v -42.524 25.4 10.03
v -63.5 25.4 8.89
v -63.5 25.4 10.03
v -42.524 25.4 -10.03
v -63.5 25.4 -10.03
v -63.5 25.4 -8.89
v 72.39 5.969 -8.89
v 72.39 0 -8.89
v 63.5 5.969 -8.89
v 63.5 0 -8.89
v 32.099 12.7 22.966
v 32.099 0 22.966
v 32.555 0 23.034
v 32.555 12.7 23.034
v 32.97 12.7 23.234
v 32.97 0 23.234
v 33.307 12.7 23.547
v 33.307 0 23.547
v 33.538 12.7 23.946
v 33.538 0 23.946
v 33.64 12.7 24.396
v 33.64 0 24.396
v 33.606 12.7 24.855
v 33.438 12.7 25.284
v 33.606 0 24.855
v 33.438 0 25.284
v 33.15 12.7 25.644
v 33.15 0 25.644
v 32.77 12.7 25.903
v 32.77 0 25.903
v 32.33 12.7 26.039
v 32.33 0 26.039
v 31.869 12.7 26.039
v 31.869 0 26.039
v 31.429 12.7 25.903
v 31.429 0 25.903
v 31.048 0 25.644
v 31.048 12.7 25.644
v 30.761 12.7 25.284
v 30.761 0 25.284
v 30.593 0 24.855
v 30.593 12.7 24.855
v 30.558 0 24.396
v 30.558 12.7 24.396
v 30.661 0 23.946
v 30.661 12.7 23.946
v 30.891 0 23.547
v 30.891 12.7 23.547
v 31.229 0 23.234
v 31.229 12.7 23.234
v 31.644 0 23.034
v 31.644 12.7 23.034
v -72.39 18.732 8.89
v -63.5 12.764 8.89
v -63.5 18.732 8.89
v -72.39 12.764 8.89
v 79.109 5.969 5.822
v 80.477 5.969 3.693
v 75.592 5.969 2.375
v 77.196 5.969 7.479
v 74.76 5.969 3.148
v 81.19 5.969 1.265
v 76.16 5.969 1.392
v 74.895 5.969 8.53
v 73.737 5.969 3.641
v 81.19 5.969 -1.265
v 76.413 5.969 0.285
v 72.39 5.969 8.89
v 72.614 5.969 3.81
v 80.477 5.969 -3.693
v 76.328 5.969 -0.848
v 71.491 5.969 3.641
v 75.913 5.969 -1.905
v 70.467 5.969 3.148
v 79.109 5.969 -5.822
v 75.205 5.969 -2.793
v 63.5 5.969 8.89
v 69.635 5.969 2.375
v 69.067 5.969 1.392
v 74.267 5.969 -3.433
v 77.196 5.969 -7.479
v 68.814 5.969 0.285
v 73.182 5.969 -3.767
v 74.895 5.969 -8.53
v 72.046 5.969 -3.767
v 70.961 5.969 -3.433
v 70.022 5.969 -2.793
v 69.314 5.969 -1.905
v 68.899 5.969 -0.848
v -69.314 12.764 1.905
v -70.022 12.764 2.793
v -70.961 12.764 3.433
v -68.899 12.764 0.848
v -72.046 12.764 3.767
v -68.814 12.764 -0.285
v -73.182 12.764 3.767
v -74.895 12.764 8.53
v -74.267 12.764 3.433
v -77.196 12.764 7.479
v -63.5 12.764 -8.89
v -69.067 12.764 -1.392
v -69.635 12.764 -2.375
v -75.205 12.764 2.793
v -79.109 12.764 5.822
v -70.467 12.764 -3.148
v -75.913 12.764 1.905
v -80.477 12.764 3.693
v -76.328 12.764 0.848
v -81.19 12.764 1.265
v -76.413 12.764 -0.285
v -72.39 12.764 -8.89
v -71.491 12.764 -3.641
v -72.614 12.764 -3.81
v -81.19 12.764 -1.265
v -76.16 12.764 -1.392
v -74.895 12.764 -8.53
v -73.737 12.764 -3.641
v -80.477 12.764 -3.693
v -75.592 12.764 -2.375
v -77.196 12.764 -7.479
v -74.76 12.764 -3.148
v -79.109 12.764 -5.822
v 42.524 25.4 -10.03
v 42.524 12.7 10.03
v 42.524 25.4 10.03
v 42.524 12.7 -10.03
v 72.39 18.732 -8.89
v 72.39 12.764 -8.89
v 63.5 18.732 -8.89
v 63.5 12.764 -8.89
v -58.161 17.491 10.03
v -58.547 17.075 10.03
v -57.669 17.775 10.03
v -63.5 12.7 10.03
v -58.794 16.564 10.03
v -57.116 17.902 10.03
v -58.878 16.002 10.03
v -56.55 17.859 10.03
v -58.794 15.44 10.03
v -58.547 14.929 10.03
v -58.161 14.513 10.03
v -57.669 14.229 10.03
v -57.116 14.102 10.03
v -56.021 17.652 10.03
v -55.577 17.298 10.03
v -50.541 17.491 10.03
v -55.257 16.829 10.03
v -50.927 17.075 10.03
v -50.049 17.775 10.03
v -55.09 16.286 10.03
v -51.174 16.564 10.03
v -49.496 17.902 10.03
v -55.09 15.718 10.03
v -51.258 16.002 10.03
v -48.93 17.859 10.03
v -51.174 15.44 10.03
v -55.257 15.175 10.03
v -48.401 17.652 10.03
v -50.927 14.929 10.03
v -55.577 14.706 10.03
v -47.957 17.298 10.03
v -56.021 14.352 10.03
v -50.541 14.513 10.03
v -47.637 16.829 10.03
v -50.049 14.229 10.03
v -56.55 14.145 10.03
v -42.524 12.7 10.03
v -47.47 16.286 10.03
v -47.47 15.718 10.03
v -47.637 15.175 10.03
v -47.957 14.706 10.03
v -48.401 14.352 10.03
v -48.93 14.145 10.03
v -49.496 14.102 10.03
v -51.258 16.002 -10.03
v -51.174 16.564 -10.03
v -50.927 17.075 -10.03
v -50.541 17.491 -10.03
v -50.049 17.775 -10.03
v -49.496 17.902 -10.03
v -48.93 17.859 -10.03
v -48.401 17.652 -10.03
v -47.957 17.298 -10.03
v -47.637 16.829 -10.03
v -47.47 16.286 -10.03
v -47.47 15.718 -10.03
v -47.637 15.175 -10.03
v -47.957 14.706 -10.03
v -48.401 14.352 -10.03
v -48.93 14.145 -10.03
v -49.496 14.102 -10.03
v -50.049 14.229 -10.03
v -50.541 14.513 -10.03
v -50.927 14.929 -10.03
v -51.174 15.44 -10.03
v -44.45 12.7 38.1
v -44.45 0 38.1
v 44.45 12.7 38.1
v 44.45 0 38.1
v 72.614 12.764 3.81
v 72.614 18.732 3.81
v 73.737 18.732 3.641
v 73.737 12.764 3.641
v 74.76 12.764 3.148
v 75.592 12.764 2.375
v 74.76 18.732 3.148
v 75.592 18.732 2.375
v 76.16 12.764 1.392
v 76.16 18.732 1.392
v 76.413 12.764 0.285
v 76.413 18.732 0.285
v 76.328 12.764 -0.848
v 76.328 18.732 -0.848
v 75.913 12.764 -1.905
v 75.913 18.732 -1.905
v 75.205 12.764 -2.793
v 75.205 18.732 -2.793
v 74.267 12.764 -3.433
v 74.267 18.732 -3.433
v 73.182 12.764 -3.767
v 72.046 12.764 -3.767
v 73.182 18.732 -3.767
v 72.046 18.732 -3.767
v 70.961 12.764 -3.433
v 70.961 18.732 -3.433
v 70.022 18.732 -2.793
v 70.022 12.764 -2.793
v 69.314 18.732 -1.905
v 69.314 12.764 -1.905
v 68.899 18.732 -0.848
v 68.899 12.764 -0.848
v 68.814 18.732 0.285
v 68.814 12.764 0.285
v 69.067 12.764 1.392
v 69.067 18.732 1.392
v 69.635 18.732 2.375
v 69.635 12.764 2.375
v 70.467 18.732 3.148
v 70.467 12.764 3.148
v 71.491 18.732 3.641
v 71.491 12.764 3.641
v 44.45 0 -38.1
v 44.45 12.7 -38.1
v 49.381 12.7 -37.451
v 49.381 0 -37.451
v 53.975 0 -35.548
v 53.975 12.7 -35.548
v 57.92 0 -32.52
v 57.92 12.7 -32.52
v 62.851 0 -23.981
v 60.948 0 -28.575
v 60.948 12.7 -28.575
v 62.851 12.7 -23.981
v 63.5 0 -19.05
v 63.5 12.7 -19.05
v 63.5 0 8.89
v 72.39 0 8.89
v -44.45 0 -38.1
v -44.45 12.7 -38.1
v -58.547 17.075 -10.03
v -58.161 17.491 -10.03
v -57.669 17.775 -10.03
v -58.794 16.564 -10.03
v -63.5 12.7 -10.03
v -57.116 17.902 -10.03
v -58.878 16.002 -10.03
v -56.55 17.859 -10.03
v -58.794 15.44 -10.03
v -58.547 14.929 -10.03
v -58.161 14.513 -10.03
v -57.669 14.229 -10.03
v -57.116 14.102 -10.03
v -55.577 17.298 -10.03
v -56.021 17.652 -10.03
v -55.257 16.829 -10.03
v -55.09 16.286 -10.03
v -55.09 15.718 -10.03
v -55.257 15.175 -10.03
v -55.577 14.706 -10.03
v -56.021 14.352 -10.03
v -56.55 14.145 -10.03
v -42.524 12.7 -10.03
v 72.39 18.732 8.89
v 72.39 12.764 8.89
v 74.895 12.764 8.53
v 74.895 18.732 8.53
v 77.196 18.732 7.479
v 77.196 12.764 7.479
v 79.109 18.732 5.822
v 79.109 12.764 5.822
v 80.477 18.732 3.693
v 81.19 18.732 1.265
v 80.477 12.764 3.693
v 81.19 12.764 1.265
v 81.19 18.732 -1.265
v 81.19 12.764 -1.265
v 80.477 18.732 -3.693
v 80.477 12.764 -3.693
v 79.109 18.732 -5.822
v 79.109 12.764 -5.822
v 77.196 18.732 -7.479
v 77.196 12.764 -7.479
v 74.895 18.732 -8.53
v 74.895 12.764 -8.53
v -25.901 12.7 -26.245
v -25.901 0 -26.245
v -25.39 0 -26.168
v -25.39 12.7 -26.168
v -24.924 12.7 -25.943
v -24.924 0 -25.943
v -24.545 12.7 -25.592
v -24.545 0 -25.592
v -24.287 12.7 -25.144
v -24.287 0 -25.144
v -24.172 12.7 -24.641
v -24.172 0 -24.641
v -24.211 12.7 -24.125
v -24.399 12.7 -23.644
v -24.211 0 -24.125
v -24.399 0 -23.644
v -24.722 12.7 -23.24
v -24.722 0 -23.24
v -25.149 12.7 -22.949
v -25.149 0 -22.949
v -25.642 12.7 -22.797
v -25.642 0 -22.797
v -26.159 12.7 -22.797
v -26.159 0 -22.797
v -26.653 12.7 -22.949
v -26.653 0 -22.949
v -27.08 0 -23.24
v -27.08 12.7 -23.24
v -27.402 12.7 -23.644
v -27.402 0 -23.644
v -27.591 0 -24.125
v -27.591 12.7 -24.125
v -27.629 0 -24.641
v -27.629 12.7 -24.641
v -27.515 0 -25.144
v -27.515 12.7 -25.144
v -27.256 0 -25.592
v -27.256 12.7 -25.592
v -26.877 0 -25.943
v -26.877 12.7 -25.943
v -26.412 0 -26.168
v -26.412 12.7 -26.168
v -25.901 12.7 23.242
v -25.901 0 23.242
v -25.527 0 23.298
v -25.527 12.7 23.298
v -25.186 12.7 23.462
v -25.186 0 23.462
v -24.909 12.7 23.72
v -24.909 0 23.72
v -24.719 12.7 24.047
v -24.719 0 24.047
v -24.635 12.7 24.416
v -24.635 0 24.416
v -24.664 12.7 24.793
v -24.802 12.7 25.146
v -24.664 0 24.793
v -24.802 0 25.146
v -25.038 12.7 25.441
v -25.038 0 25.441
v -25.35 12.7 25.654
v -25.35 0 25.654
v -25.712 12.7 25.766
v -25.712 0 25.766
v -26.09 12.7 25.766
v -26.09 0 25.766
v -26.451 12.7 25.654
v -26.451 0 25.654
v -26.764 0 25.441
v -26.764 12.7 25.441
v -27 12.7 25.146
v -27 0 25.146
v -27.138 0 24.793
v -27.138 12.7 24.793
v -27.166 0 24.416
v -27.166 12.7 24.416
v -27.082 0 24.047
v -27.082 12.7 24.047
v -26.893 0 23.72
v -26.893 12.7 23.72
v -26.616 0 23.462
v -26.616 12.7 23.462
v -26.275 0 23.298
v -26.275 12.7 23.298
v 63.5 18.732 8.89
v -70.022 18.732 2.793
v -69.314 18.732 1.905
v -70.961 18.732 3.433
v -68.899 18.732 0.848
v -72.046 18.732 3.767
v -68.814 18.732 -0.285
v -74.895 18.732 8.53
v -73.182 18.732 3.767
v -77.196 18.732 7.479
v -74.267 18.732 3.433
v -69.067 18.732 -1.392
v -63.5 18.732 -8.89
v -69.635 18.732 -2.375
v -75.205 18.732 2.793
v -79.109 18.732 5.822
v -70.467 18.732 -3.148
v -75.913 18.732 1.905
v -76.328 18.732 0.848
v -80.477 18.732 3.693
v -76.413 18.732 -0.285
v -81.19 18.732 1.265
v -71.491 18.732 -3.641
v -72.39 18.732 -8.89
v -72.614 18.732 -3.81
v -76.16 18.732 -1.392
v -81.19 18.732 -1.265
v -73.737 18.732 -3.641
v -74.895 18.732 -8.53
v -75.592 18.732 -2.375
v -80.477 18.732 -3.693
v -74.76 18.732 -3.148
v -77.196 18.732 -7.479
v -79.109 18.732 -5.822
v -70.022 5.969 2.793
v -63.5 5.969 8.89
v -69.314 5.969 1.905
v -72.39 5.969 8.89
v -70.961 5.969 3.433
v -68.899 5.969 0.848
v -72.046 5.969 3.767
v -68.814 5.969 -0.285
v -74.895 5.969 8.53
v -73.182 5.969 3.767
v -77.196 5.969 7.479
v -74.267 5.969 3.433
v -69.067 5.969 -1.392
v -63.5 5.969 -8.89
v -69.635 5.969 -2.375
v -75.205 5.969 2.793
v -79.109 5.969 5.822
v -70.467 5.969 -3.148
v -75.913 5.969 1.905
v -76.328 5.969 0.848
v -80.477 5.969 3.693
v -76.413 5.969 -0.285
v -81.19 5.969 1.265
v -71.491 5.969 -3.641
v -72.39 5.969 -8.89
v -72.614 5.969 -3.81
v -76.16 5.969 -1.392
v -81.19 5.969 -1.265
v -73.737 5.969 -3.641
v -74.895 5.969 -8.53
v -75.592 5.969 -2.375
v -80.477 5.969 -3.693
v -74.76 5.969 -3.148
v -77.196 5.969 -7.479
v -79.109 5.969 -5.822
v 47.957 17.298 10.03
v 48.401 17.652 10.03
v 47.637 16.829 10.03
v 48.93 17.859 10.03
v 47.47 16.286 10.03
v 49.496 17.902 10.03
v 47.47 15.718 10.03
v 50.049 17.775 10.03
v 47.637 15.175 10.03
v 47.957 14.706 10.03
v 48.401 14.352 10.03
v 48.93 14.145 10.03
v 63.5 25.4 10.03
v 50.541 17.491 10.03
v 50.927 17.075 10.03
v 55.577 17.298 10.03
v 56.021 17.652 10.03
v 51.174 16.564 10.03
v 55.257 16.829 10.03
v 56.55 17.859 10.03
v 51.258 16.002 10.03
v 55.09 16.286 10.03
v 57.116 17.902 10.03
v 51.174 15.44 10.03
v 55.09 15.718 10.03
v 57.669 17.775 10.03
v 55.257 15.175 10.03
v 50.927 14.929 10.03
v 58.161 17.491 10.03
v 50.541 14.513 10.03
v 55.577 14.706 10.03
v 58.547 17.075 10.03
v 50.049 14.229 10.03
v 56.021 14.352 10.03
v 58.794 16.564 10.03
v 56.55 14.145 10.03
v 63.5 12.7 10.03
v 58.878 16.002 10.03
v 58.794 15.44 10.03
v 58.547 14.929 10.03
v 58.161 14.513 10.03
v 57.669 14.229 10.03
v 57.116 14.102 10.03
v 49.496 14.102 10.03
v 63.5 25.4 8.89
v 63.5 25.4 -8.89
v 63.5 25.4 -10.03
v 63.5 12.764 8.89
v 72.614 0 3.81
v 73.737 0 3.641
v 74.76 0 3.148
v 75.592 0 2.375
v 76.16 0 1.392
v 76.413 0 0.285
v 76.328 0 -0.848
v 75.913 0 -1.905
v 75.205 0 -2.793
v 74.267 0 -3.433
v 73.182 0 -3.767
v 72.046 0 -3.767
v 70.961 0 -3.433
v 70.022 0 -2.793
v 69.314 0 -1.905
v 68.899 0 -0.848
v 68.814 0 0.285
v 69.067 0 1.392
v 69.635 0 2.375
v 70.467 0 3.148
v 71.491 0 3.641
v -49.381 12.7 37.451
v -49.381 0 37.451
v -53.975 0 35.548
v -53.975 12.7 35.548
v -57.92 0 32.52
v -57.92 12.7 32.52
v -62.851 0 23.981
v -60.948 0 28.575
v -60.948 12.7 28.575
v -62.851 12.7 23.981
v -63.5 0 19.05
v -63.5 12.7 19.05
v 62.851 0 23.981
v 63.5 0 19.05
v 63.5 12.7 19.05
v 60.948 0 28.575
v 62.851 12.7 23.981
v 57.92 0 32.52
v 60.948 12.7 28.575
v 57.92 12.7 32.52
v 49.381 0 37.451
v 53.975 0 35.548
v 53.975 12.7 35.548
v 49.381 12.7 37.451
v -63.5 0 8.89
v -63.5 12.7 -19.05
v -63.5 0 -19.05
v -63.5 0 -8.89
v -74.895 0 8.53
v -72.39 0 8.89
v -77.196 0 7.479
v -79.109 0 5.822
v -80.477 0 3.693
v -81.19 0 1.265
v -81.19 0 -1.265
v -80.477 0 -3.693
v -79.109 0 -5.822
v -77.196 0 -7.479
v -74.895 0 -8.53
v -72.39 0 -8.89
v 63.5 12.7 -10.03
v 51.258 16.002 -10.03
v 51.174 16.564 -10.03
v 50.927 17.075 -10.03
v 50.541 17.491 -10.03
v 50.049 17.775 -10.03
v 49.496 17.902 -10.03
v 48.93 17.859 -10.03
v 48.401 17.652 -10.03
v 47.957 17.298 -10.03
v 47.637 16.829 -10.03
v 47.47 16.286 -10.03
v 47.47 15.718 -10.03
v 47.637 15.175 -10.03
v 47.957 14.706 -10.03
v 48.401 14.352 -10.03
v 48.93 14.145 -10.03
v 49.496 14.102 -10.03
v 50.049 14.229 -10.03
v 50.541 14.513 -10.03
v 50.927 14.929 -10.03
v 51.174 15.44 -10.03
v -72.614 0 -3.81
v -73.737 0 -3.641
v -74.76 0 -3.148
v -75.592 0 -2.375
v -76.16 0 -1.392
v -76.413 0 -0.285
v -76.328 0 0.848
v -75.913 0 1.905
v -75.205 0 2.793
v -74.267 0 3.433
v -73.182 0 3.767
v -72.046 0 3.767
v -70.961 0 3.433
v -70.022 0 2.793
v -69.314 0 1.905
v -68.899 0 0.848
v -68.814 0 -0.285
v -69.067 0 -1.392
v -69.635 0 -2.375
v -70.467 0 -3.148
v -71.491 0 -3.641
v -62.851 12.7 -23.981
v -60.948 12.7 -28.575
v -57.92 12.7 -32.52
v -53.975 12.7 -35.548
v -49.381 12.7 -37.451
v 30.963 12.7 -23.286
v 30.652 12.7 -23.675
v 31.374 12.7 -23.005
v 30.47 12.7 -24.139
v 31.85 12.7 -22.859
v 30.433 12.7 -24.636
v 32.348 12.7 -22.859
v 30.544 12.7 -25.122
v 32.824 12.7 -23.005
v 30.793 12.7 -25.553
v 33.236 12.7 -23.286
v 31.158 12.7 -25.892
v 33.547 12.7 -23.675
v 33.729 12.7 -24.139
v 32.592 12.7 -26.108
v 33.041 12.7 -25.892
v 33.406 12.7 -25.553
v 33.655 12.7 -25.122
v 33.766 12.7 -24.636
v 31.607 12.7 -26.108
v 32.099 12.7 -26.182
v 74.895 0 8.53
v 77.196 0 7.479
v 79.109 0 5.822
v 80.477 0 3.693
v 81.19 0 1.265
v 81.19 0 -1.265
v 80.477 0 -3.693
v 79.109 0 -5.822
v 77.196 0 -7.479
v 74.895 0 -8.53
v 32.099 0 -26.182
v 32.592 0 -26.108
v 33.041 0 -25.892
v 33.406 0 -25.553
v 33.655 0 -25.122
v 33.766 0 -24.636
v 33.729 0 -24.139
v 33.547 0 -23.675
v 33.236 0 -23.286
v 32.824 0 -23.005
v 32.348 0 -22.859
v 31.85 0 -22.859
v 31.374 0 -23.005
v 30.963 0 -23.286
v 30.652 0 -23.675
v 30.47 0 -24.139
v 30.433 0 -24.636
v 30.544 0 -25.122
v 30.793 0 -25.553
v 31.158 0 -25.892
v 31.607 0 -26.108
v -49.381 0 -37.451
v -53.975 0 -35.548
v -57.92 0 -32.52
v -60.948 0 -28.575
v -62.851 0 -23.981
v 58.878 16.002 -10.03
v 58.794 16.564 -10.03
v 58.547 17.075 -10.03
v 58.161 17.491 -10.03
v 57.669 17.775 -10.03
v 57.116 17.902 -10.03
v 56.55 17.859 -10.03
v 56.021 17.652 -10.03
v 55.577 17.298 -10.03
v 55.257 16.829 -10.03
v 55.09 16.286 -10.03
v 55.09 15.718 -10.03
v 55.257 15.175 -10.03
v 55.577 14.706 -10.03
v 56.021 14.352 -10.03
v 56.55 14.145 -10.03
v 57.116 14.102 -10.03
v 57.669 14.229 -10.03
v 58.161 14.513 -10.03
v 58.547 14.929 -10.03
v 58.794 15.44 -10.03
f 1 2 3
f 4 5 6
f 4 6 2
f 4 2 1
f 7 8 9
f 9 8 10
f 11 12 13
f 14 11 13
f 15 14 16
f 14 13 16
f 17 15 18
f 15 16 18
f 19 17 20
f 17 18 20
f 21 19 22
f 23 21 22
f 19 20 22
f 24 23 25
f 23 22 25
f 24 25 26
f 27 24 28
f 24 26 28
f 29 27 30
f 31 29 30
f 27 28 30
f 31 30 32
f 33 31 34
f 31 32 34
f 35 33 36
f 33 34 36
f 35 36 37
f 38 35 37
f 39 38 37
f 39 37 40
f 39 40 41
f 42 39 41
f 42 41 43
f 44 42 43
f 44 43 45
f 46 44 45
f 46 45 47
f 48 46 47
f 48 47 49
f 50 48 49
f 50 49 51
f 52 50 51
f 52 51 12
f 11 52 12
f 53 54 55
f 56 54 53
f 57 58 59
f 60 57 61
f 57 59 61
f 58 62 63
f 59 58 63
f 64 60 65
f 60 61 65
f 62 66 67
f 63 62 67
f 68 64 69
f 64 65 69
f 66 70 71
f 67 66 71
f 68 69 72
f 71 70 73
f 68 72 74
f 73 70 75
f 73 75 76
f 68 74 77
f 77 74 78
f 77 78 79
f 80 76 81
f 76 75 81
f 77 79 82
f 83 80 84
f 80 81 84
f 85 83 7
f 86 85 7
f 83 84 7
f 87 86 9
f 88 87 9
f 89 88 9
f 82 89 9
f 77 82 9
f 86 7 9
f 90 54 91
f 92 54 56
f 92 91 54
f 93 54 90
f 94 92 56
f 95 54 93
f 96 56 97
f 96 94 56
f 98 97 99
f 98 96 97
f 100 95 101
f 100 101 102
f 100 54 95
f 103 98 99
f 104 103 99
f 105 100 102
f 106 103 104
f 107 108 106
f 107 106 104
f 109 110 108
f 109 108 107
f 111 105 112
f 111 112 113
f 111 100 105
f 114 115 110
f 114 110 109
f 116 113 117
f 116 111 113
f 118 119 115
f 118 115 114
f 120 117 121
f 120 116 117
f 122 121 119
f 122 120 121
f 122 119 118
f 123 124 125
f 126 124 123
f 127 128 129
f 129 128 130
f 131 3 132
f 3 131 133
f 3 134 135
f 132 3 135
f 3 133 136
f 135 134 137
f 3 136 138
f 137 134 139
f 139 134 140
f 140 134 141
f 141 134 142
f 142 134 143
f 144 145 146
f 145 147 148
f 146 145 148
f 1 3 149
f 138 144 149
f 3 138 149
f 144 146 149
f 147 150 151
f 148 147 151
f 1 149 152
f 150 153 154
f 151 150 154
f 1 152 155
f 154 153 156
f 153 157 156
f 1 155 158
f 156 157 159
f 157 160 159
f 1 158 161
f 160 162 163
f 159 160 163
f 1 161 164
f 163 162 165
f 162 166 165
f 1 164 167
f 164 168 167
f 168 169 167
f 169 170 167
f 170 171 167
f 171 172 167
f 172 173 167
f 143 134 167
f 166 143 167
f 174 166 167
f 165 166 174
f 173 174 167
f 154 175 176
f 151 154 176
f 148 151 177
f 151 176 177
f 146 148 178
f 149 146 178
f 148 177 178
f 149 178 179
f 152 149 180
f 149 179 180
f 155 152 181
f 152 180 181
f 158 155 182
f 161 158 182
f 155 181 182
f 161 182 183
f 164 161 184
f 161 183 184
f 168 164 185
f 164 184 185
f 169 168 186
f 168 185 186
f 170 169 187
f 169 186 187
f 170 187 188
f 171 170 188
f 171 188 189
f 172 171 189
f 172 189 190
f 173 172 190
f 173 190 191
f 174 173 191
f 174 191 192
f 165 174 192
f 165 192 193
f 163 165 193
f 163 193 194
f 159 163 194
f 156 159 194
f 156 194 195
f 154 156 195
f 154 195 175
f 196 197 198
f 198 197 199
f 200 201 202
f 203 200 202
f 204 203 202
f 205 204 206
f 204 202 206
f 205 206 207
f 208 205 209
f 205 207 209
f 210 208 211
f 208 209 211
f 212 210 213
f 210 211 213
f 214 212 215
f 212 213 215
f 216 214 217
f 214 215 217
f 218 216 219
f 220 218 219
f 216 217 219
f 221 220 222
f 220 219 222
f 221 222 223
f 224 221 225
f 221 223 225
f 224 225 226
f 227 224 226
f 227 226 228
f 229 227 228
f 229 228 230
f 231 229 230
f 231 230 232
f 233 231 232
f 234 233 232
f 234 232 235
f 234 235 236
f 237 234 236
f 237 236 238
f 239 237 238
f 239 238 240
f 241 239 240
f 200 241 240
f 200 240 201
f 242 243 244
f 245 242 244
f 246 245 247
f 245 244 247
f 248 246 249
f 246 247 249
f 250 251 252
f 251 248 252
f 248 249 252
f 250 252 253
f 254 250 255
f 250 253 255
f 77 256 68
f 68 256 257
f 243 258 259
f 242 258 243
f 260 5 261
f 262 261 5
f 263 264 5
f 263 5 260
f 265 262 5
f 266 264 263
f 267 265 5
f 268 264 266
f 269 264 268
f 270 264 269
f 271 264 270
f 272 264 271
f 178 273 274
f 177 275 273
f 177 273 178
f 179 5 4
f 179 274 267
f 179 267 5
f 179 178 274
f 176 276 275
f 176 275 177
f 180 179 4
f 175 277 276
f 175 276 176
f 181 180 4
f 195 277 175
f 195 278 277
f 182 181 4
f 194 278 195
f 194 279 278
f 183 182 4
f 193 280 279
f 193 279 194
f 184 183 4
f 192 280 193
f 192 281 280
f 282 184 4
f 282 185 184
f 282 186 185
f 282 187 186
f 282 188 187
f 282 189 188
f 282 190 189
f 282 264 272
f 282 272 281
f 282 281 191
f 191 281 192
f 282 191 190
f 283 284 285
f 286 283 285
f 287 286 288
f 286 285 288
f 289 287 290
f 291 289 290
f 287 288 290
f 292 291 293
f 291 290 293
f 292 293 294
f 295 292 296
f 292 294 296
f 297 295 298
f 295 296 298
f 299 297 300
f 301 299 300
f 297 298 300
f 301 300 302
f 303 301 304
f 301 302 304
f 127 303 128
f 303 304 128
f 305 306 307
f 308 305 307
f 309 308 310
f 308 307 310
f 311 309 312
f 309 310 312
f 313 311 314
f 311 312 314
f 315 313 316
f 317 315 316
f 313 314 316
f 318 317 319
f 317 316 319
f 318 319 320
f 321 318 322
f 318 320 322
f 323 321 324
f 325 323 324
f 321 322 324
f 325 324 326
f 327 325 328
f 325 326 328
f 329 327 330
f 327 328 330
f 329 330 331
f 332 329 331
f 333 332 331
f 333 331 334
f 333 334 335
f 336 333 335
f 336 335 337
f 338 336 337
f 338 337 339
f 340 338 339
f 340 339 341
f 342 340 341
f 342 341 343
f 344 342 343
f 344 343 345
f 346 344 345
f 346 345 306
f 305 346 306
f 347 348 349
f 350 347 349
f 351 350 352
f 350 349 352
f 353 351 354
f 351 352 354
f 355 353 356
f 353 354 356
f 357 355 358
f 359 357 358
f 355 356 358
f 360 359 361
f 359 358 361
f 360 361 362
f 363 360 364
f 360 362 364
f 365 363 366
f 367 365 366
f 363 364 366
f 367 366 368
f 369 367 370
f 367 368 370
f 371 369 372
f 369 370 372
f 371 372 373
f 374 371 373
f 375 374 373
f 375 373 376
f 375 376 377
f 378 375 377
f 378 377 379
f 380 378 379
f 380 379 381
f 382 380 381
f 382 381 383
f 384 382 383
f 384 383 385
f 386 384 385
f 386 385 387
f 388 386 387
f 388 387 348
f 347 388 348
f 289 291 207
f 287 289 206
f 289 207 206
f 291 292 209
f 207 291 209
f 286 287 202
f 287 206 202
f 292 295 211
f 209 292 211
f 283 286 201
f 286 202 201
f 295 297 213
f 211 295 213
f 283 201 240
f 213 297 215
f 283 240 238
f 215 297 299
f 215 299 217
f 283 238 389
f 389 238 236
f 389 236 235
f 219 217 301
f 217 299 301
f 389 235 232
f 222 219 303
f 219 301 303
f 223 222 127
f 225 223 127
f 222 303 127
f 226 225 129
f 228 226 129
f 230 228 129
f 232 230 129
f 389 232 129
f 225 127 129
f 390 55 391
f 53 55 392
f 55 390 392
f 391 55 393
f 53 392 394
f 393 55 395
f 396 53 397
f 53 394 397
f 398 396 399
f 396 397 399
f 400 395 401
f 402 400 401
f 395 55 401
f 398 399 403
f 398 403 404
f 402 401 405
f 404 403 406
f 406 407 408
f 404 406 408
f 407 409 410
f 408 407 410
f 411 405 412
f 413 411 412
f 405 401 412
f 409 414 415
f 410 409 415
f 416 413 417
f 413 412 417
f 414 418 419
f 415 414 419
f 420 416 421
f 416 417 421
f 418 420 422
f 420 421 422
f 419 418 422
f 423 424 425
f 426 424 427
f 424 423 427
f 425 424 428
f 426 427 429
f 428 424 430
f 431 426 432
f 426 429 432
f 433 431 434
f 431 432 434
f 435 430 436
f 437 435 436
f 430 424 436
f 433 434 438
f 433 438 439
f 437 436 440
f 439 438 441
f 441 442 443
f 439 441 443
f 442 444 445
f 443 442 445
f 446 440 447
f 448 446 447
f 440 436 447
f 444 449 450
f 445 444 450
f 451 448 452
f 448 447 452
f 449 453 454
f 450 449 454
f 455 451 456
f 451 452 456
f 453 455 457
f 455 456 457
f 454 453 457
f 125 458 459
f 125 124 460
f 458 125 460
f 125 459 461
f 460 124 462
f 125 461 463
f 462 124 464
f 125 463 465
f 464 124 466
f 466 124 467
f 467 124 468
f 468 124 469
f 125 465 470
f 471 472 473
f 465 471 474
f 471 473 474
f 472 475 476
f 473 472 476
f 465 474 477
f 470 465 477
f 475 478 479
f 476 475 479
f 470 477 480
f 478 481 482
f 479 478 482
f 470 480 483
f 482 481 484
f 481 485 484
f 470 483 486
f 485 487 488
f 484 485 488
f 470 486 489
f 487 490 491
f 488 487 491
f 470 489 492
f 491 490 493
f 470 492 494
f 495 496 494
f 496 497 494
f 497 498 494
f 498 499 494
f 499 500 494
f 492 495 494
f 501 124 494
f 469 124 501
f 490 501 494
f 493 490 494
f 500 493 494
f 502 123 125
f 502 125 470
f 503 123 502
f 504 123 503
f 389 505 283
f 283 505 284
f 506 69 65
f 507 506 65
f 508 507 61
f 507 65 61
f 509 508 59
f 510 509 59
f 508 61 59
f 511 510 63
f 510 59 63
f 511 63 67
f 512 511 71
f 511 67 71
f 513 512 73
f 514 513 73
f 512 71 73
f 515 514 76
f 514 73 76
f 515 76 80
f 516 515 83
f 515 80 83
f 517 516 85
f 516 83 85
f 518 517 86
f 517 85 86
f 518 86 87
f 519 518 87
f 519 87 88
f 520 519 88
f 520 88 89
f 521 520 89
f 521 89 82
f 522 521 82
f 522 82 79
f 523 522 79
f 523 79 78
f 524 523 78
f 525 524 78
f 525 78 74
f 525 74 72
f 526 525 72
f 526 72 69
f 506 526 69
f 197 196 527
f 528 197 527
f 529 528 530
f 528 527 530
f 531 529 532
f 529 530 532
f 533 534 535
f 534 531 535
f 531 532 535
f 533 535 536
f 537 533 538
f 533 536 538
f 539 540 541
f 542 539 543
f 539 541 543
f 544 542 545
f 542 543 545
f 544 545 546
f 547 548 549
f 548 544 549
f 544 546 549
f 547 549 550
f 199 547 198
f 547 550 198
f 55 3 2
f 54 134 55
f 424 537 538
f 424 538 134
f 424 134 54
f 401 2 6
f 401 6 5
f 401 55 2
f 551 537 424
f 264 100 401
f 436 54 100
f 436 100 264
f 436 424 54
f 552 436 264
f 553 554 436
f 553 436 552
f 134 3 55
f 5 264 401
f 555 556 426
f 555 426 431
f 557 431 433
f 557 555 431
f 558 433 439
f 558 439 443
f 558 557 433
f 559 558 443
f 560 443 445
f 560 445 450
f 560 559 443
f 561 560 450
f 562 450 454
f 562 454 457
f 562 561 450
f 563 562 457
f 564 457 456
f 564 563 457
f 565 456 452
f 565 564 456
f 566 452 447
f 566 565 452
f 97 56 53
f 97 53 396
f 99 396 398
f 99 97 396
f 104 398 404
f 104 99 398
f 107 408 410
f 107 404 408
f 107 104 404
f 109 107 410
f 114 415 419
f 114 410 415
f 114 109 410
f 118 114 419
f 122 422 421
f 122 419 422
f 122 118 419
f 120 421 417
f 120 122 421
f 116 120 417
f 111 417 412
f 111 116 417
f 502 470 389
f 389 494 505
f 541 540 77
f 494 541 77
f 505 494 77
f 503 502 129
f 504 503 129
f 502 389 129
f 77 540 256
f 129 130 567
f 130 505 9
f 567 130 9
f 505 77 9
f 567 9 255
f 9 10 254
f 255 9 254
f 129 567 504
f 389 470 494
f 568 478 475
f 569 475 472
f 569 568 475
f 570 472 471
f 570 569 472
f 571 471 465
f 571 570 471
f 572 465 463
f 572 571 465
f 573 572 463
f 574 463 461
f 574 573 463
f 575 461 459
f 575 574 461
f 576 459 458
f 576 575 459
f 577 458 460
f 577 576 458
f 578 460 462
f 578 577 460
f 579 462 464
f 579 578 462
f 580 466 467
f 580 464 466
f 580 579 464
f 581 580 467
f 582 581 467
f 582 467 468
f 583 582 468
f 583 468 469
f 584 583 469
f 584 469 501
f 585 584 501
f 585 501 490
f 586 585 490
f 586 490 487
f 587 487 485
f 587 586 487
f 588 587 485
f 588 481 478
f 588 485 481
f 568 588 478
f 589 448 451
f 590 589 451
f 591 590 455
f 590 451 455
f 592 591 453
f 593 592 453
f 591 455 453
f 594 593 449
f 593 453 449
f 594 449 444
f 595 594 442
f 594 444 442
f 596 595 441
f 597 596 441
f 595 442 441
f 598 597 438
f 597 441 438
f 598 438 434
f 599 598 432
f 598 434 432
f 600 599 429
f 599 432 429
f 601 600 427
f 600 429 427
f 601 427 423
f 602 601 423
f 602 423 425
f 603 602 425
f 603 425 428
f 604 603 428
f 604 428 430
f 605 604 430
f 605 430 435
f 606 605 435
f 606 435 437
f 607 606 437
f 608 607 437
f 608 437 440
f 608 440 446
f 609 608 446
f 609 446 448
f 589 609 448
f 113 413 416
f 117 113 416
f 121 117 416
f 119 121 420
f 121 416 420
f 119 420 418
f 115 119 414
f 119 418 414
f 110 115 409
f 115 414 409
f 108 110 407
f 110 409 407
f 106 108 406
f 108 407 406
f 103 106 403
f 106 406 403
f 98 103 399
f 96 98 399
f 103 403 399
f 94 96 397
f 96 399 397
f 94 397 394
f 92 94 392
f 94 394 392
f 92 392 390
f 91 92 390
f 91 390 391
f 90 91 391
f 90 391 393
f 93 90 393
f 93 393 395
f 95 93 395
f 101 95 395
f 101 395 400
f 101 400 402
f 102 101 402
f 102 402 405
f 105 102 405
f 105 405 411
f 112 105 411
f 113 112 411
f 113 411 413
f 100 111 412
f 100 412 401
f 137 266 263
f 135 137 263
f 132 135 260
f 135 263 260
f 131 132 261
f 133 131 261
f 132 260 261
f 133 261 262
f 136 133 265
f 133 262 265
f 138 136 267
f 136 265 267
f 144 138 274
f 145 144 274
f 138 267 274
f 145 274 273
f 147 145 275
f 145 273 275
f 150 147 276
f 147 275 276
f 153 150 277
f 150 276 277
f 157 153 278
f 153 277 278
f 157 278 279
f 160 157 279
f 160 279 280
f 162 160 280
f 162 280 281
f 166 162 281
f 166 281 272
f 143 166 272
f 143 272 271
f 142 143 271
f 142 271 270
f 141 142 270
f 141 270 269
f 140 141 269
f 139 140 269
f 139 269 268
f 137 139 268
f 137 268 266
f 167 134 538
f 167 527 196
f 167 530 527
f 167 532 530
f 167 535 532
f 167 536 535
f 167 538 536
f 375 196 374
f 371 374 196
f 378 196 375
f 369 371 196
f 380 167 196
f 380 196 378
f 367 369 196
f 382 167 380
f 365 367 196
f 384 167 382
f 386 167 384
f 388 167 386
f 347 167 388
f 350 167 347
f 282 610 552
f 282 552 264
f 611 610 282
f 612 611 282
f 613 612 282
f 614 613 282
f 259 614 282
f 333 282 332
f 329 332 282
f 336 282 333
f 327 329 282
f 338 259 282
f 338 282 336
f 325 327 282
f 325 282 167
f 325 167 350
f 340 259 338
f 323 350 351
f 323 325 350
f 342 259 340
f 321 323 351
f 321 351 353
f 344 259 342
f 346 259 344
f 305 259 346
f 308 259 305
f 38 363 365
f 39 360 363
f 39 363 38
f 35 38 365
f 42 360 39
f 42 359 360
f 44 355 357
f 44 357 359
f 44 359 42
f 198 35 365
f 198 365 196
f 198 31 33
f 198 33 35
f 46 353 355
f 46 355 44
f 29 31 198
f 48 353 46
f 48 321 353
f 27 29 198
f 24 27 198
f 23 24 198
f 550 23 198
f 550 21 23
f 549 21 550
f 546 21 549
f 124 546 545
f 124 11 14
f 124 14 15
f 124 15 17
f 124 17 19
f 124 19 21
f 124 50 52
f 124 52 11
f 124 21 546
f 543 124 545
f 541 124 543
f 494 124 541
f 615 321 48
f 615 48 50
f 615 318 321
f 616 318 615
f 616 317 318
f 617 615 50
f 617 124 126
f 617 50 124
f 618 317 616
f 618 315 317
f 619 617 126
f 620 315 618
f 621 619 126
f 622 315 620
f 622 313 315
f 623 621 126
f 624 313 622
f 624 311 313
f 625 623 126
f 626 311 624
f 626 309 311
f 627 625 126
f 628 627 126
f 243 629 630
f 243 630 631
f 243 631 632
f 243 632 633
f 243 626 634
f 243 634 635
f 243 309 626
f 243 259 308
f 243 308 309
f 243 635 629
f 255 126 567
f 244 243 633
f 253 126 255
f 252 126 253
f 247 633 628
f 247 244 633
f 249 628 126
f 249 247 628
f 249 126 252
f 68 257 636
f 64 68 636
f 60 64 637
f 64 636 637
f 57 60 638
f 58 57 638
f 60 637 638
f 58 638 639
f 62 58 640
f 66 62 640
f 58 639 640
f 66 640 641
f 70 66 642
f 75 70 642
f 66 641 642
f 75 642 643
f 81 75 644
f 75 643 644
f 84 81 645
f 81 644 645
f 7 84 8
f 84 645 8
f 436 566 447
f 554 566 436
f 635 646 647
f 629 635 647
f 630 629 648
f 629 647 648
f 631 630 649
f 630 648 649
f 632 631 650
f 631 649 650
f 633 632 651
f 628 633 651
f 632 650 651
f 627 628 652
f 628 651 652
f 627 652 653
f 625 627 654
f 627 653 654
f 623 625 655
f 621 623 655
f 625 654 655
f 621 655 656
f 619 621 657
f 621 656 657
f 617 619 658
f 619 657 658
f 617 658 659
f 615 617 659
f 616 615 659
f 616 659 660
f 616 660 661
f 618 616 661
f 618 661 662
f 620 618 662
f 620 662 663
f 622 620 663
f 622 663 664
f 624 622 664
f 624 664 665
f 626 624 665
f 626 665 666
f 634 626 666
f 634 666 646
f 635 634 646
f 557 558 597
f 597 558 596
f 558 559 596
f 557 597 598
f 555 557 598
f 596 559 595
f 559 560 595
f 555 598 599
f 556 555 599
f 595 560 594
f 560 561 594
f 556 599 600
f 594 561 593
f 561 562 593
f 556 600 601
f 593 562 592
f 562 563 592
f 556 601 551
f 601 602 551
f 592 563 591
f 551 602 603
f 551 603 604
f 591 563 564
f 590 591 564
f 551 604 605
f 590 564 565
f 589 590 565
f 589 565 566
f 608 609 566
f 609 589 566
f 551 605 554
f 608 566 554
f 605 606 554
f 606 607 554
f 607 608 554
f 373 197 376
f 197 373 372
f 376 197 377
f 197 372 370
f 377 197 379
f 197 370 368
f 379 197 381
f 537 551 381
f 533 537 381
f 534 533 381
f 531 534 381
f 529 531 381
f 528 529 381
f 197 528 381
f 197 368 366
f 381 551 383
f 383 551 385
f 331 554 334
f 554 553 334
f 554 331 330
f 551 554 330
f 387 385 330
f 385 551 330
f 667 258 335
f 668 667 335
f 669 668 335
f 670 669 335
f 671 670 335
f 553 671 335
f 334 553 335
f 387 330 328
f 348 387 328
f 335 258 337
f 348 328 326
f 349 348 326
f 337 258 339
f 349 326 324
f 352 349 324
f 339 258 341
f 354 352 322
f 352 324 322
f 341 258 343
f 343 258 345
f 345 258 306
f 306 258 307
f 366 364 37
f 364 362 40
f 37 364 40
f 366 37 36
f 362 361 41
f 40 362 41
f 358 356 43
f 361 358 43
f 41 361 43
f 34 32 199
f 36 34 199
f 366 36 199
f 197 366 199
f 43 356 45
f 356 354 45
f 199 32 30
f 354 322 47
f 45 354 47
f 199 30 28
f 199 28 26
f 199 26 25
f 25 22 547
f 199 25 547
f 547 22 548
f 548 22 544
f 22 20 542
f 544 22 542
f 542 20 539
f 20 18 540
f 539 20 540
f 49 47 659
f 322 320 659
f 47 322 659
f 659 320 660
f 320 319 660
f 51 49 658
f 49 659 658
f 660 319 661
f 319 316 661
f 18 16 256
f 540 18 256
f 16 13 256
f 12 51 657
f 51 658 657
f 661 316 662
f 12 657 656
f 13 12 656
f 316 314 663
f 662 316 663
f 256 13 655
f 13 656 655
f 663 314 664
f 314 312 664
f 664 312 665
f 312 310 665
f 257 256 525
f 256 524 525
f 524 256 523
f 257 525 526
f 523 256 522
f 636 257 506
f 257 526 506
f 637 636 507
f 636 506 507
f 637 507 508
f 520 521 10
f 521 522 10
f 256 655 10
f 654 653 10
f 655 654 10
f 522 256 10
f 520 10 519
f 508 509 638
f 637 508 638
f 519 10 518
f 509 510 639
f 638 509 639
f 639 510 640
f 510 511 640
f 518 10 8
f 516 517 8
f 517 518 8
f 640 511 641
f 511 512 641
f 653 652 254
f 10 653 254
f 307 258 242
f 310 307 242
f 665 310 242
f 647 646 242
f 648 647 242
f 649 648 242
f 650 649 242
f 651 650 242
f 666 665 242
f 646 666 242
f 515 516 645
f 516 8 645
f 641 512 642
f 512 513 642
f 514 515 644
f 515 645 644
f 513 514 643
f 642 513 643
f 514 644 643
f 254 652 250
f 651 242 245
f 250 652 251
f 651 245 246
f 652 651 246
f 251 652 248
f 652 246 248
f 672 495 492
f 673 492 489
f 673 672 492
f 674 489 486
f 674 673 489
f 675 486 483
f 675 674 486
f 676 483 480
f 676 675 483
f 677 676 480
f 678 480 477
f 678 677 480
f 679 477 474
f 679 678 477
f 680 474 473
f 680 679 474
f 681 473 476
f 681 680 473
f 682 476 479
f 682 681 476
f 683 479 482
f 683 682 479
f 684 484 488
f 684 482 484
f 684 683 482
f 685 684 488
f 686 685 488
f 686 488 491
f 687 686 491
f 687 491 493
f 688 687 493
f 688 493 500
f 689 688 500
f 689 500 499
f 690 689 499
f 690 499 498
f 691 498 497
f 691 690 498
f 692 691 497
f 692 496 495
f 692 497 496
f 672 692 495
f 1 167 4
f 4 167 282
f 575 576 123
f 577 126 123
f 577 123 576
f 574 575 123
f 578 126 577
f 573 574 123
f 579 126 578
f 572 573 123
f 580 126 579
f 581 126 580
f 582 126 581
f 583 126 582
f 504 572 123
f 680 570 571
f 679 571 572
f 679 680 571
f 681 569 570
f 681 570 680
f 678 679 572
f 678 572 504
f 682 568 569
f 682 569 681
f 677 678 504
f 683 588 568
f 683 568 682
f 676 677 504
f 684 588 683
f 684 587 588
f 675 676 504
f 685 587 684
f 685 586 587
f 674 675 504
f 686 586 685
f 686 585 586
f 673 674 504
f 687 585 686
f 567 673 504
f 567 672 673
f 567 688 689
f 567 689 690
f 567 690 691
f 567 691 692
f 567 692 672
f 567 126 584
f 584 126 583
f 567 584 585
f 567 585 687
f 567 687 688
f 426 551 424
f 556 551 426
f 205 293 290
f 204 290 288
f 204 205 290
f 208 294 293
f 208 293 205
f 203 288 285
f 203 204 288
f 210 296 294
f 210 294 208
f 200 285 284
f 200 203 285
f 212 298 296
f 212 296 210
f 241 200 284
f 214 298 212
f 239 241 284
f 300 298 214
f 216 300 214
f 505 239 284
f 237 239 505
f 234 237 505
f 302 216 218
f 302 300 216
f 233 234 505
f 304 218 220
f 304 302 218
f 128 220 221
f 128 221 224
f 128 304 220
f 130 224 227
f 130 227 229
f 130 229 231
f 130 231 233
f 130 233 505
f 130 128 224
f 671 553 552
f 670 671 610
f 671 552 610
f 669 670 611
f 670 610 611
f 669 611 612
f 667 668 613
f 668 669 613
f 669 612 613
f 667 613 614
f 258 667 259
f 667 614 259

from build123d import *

# Parameters (mm, degrees)
SKETCH1_W                 = 127
SKETCH1_H                 = 76.2
BOSS_EXTRUDE1_DEPTH       = 12.7
BOSS_EXTRUDE2_DEPTH       = 12.7
BOSS_EXTRUDE2_DEPTH_BACK  = 12.7
SKETCH3_R                 = 3.81
CUT_EXTRUDE1_DEPTH        = 29.464
SKETCH4_W                 = 17.78
SKETCH4_H                 = 6.604
CUT_EXTRUDE2_DEPTH        = 29.464
BOSS_EXTRUDE3_START       = -12.7
BOSS_EXTRUDE3_OUTLINE_W   = 57.78
BOSS_EXTRUDE3_OUTLINE_H   = 32.76
BOSS_EXTRUDE3_OUTLINE_W_2 = 40
BOSS_EXTRUDE3_OUTLINE_H_2 = 20.06
BOSS_EXTRUDE3_DEPTH       = 45.5
CUT_EXTRUDE5_DEPTH        = 44.196
SKETCH10_W                = 20.976278311
SKETCH10_H                = 20.06
BOSS_EXTRUDE5_DEPTH       = 12.7
CUT_EXTRUDE7_DEPTH        = 187.177258339
CUT_EXTRUDE7_DEPTH_BACK   = 76.2
SKETCH11_W                = 20.06
SKETCH11_H                = 7.443830751
SPLIT1_START              = 12.7
SPLIT1_OUTLINE_W          = 57.78
SPLIT1_OUTLINE_H          = 32.76
SPLIT1_OUTLINE_W_2        = 40
SPLIT1_OUTLINE_H_2        = 20.06
SPLIT1_DEPTH              = 45.5
CUT_EXTRUDE9_DEPTH        = 24.384
SKETCH13_R                = 1.905
CUT_EXTRUDE10_DEPTH       = 36.83
SKETCH14_W                = 17.78
SKETCH14_H                = 0.127
CUT_EXTRUDE11_DEPTH       = 98.260775753
SKETCH15_W                = 17.78
SKETCH15_H                = 0.0635
CUT_EXTRUDE12_DEPTH       = 98.260775753
SKETCH16_W                = 17.78
SKETCH16_H                = 0.0635
CUT_EXTRUDE13_DEPTH       = 98.260775753
SKETCH17_W                = 17.78
SKETCH17_H                = 0.127
CUT_EXTRUDE14_DEPTH       = 98.260775753
SKETCH18_W                = 17.78
SKETCH18_H                = 0.0635
CUT_EXTRUDE15_DEPTH       = 98.260775753
SKETCH19_R                = 1.671154259
SKETCH19_R_2              = 1.733603543
SKETCH19_R_3              = 1.269040072
SKETCH19_R_4              = 1.545344409
CUT_EXTRUDE16_DEPTH       = 94.290987775


# Read off the part's stored shape, not the designer's step: Boss-Extrude3, Split1
with BuildPart() as part:
    # Sketch1 → Boss-Extrude1 (new body)
    with BuildSketch(Plane(origin=(0, 0, 0), x_dir=(1, 0, 0), z_dir=(0, 1, 0))):
        Rectangle(SKETCH1_W, SKETCH1_H)
    extrude(amount=BOSS_EXTRUDE1_DEPTH)

    # Sketch2 → Boss-Extrude2 (add, two sides: drawn at the far end of the back side and taken through both)
    with BuildSketch(Plane(origin=(0, 12.7, 0), x_dir=(1, 0, 0), z_dir=(0, 1, 0)).offset(-BOSS_EXTRUDE2_DEPTH_BACK)):
        with BuildLine():
            Line((72.39, 8.89), (63.5, 8.89))
            Line((63.5, 8.89), (48.26, 8.89))
            Line((48.26, 8.89), (48.26, -8.89))
            Line((48.26, -8.89), (63.5, -8.89))
            Line((63.5, -8.89), (72.39, -8.89))
            ThreePointArc((72.39, -8.89), (81.28, 0), (72.39, 8.89))
        make_face()
        with BuildLine():
            Line((-48.26, -8.89), (-63.5, -8.89))
            Line((-63.5, -8.89), (-72.39, -8.89))
            ThreePointArc((-72.39, -8.89), (-81.28, 0), (-72.39, 8.89))
            Line((-72.39, 8.89), (-63.5, 8.89))
            Line((-63.5, 8.89), (-48.26, 8.89))
            Line((-48.26, 8.89), (-48.26, -8.89))
        make_face()
    extrude(amount=BOSS_EXTRUDE2_DEPTH + BOSS_EXTRUDE2_DEPTH_BACK)

    # Sketch3 → Cut-Extrude1 (cut)
    with BuildSketch(Plane(origin=(0, 25.4, 0), x_dir=(1, 0, 0), z_dir=(0, 1, 0))):
        with Locations(Location((72.613721689, 0, 0), (0, 0, 270))):
            Circle(SKETCH3_R)
        with Locations(Location((-72.613721689, 0, 0), (0, 0, 90))):
            Circle(SKETCH3_R)
    extrude(amount=-CUT_EXTRUDE1_DEPTH, mode=Mode.SUBTRACT)

    # Sketch4 → Cut-Extrude2 (cut)
    with BuildSketch(Plane.XY.offset(8.89)):
        with Locations((72.39, 22.098)):
            Rectangle(SKETCH4_W, SKETCH4_H)
        with Locations((72.39, 9.398)):
            Rectangle(SKETCH4_W, SKETCH4_H)
        with Locations((-72.39, 9.398)):
            Rectangle(SKETCH4_W, SKETCH4_H)
        with Locations((-72.39, 22.098)):
            Rectangle(SKETCH4_W, SKETCH4_H)
    extrude(amount=-CUT_EXTRUDE2_DEPTH, mode=Mode.SUBTRACT)



with BuildPart() as body_2:
    # Boss-Extrude3 outline → Boss-Extrude3 (new body)
    with BuildSketch(Plane(origin=(0, 25.4, 0), x_dir=(1, 0, 0), z_dir=(0, 1, 0)).offset(BOSS_EXTRUDE3_START)):
        with Locations((62.523721689, 0)):
            Rectangle(BOSS_EXTRUDE3_OUTLINE_W, BOSS_EXTRUDE3_OUTLINE_H)
        with Locations((62.523721689, 0)):
            Rectangle(BOSS_EXTRUDE3_OUTLINE_W_2, BOSS_EXTRUDE3_OUTLINE_H_2, mode=Mode.SUBTRACT)
    extrude(amount=BOSS_EXTRUDE3_DEPTH)

    # Sketch7 → Cut-Extrude5 (cut)
    with BuildSketch(Plane.XY.offset(16.38)):
        with BuildLine():
            Line((91.413721689, 45.5), (91.413721689, 12.7))
            Line((91.413721689, 12.7), (63.5, 12.7))
            add(Edge.make_bspline(
                [(91.413721689, 45.5), (71.582716482, 29.1), (63.5, 12.7)],
                knots=[0, 0, 0, 1, 1, 1], degree=2, weights=[1, 3, 1]))
        make_face()
    extrude(amount=-CUT_EXTRUDE5_DEPTH, mode=Mode.SUBTRACT)


with BuildPart() as part_1:
    add(part.part)

    add(body_2.part)  # Boss-Extrude5 merges body 2
    # Sketch10 → Boss-Extrude5 (add)
    with BuildSketch(Plane(origin=(0, 12.7, 0), x_dir=(1, 0, 0), z_dir=(0, 1, 0))):
        with Locations((53.011860845, 0)):
            Rectangle(SKETCH10_W, SKETCH10_H)
        with Locations((-53.011860845, 0)):
            Rectangle(SKETCH10_W, SKETCH10_H)
    extrude(amount=BOSS_EXTRUDE5_DEPTH)

    # Sketch11 → Cut-Extrude7 (cut, two sides: drawn at the far end of the back side and taken through both)
    with BuildSketch(Plane(origin=(91.413721689, 0, 0), x_dir=(0, 0, -1), z_dir=(1, 0, 0)).offset(-CUT_EXTRUDE7_DEPTH_BACK)):
        with Locations((0, 41.778084624)):
            Rectangle(SKETCH11_W, SKETCH11_H)
    extrude(amount=CUT_EXTRUDE7_DEPTH + CUT_EXTRUDE7_DEPTH_BACK, mode=Mode.SUBTRACT)

    # Split1 outline → Split1 (cut)
    with BuildSketch(Plane(origin=(0, 0, 0), x_dir=(1, 0, 0), z_dir=(0, 1, 0)).offset(SPLIT1_START)):
        with Locations((62.523721689, 0)):
            Rectangle(SPLIT1_OUTLINE_W, SPLIT1_OUTLINE_H)
        with Locations((62.523721689, 0)):
            Rectangle(SPLIT1_OUTLINE_W_2, SPLIT1_OUTLINE_H_2, mode=Mode.SUBTRACT)
    extrude(amount=SPLIT1_DEPTH, mode=Mode.SUBTRACT)

    # Sketch12 → Cut-Extrude9 (cut)
    with BuildSketch(Plane(origin=(0, 12.7, 0), x_dir=(1, 0, 0), z_dir=(0, 1, 0))):
        with BuildLine():
            Line((63.5, 38.1), (44.45, 38.1))
            ThreePointArc((44.45, 38.1), (57.920384182, 32.520384182), (63.5, 19.05))
            Line((63.5, 19.05), (63.5, 38.1))
        make_face()
        with BuildLine():
            Line((63.5, -38.1), (63.5, -19.05))
            ThreePointArc((63.5, -19.05), (57.920384182, -32.520384182), (44.45, -38.1))
            Line((44.45, -38.1), (63.5, -38.1))
        make_face()
        with BuildLine():
            Line((-63.5, -38.1), (-44.45, -38.1))
            ThreePointArc((-44.45, -38.1), (-57.920384182, -32.520384182), (-63.5, -19.05))
            Line((-63.5, -19.05), (-63.5, -38.1))
        make_face()
        with BuildLine():
            ThreePointArc((-63.5, 19.05), (-57.920384182, 32.520384182), (-44.45, 38.1))
            Line((-44.45, 38.1), (-63.5, 38.1))
            Line((-63.5, 38.1), (-63.5, 19.05))
        make_face()
    extrude(amount=-CUT_EXTRUDE9_DEPTH, mode=Mode.SUBTRACT)

    # Sketch13 → Cut-Extrude10 (cut)
    with BuildSketch(Plane(origin=(0, 0, -10.03), x_dir=(-1, 0, 0), z_dir=(0, 0, -1))):
        with Locations((56.9735, 16.002)):
            Circle(SKETCH13_R)
        with Locations((49.3535, 16.002)):
            Circle(SKETCH13_R)
    cut_extrude10 = extrude(amount=-CUT_EXTRUDE10_DEPTH, mode=Mode.SUBTRACT)

    # Mirror1: Cut-Extrude10 across plane
    add(cut_extrude10.mirror(Plane(origin=(0, 0, 0), x_dir=(0, 0, 1), z_dir=(1, 0, 0))), mode=Mode.SUBTRACT)

    # Sketch14 → Cut-Extrude11 (cut, through all)
    with BuildSketch(Plane(origin=(0, 0, -8.89), x_dir=(-1, 0, 0), z_dir=(0, 0, -1))):
        with Locations((72.39, 6.0325)):
            Rectangle(SKETCH14_W, SKETCH14_H)
    extrude(amount=-CUT_EXTRUDE11_DEPTH, mode=Mode.SUBTRACT)

    # Sketch15 → Cut-Extrude12 (cut, through all)
    with BuildSketch(Plane(origin=(0, 0, -8.89), x_dir=(-1, 0, 0), z_dir=(0, 0, -1))):
        with Locations((72.39, 18.76425)):
            Rectangle(SKETCH15_W, SKETCH15_H)
    extrude(amount=-CUT_EXTRUDE12_DEPTH, mode=Mode.SUBTRACT)

    # Sketch16 → Cut-Extrude13 (cut, through all)
    with BuildSketch(Plane(origin=(0, 0, -8.89), x_dir=(-1, 0, 0), z_dir=(0, 0, -1))):
        with Locations((72.39, 12.73175)):
            Rectangle(SKETCH16_W, SKETCH16_H)
    extrude(amount=-CUT_EXTRUDE13_DEPTH, mode=Mode.SUBTRACT)

    # Sketch17 → Cut-Extrude14 (cut, through all)
    with BuildSketch(Plane(origin=(0, 0, -8.89), x_dir=(-1, 0, 0), z_dir=(0, 0, -1))):
        with Locations((-72.39, 6.0325)):
            Rectangle(SKETCH17_W, SKETCH17_H)
    extrude(amount=-CUT_EXTRUDE14_DEPTH, mode=Mode.SUBTRACT)

    # Sketch18 → Cut-Extrude15 (cut, through all)
    with BuildSketch(Plane(origin=(0, 0, -8.89), x_dir=(-1, 0, 0), z_dir=(0, 0, -1))):
        with Locations((-72.39, 12.73175)):
            Rectangle(SKETCH18_W, SKETCH18_H)
        with Locations((-72.39, 18.76425)):
            Rectangle(SKETCH18_W, SKETCH18_H)
    extrude(amount=-CUT_EXTRUDE15_DEPTH, mode=Mode.SUBTRACT)

    # Sketch19 → Cut-Extrude16 (cut, through all)
    with BuildSketch(Plane(origin=(0, 0, 0), x_dir=(-1, 0, 0), z_dir=(0, -1, 0))):
        with Locations(Location((-32.09925, 24.511, 0), (0, 0, 90))):
            Circle(SKETCH19_R)
        with Locations(Location((25.90074068, 24.511, 0), (0, 0, 90))):
            Circle(SKETCH19_R_2)
        with Locations(Location((25.90074068, -24.511, 0), (0, 0, 90))):
            Circle(SKETCH19_R_3)
        with Locations(Location((-32.09925, -24.511, 0), (0, 0, 90))):
            Circle(SKETCH19_R_4)
    extrude(amount=-CUT_EXTRUDE16_DEPTH, mode=Mode.SUBTRACT)


solid = part_1.part
